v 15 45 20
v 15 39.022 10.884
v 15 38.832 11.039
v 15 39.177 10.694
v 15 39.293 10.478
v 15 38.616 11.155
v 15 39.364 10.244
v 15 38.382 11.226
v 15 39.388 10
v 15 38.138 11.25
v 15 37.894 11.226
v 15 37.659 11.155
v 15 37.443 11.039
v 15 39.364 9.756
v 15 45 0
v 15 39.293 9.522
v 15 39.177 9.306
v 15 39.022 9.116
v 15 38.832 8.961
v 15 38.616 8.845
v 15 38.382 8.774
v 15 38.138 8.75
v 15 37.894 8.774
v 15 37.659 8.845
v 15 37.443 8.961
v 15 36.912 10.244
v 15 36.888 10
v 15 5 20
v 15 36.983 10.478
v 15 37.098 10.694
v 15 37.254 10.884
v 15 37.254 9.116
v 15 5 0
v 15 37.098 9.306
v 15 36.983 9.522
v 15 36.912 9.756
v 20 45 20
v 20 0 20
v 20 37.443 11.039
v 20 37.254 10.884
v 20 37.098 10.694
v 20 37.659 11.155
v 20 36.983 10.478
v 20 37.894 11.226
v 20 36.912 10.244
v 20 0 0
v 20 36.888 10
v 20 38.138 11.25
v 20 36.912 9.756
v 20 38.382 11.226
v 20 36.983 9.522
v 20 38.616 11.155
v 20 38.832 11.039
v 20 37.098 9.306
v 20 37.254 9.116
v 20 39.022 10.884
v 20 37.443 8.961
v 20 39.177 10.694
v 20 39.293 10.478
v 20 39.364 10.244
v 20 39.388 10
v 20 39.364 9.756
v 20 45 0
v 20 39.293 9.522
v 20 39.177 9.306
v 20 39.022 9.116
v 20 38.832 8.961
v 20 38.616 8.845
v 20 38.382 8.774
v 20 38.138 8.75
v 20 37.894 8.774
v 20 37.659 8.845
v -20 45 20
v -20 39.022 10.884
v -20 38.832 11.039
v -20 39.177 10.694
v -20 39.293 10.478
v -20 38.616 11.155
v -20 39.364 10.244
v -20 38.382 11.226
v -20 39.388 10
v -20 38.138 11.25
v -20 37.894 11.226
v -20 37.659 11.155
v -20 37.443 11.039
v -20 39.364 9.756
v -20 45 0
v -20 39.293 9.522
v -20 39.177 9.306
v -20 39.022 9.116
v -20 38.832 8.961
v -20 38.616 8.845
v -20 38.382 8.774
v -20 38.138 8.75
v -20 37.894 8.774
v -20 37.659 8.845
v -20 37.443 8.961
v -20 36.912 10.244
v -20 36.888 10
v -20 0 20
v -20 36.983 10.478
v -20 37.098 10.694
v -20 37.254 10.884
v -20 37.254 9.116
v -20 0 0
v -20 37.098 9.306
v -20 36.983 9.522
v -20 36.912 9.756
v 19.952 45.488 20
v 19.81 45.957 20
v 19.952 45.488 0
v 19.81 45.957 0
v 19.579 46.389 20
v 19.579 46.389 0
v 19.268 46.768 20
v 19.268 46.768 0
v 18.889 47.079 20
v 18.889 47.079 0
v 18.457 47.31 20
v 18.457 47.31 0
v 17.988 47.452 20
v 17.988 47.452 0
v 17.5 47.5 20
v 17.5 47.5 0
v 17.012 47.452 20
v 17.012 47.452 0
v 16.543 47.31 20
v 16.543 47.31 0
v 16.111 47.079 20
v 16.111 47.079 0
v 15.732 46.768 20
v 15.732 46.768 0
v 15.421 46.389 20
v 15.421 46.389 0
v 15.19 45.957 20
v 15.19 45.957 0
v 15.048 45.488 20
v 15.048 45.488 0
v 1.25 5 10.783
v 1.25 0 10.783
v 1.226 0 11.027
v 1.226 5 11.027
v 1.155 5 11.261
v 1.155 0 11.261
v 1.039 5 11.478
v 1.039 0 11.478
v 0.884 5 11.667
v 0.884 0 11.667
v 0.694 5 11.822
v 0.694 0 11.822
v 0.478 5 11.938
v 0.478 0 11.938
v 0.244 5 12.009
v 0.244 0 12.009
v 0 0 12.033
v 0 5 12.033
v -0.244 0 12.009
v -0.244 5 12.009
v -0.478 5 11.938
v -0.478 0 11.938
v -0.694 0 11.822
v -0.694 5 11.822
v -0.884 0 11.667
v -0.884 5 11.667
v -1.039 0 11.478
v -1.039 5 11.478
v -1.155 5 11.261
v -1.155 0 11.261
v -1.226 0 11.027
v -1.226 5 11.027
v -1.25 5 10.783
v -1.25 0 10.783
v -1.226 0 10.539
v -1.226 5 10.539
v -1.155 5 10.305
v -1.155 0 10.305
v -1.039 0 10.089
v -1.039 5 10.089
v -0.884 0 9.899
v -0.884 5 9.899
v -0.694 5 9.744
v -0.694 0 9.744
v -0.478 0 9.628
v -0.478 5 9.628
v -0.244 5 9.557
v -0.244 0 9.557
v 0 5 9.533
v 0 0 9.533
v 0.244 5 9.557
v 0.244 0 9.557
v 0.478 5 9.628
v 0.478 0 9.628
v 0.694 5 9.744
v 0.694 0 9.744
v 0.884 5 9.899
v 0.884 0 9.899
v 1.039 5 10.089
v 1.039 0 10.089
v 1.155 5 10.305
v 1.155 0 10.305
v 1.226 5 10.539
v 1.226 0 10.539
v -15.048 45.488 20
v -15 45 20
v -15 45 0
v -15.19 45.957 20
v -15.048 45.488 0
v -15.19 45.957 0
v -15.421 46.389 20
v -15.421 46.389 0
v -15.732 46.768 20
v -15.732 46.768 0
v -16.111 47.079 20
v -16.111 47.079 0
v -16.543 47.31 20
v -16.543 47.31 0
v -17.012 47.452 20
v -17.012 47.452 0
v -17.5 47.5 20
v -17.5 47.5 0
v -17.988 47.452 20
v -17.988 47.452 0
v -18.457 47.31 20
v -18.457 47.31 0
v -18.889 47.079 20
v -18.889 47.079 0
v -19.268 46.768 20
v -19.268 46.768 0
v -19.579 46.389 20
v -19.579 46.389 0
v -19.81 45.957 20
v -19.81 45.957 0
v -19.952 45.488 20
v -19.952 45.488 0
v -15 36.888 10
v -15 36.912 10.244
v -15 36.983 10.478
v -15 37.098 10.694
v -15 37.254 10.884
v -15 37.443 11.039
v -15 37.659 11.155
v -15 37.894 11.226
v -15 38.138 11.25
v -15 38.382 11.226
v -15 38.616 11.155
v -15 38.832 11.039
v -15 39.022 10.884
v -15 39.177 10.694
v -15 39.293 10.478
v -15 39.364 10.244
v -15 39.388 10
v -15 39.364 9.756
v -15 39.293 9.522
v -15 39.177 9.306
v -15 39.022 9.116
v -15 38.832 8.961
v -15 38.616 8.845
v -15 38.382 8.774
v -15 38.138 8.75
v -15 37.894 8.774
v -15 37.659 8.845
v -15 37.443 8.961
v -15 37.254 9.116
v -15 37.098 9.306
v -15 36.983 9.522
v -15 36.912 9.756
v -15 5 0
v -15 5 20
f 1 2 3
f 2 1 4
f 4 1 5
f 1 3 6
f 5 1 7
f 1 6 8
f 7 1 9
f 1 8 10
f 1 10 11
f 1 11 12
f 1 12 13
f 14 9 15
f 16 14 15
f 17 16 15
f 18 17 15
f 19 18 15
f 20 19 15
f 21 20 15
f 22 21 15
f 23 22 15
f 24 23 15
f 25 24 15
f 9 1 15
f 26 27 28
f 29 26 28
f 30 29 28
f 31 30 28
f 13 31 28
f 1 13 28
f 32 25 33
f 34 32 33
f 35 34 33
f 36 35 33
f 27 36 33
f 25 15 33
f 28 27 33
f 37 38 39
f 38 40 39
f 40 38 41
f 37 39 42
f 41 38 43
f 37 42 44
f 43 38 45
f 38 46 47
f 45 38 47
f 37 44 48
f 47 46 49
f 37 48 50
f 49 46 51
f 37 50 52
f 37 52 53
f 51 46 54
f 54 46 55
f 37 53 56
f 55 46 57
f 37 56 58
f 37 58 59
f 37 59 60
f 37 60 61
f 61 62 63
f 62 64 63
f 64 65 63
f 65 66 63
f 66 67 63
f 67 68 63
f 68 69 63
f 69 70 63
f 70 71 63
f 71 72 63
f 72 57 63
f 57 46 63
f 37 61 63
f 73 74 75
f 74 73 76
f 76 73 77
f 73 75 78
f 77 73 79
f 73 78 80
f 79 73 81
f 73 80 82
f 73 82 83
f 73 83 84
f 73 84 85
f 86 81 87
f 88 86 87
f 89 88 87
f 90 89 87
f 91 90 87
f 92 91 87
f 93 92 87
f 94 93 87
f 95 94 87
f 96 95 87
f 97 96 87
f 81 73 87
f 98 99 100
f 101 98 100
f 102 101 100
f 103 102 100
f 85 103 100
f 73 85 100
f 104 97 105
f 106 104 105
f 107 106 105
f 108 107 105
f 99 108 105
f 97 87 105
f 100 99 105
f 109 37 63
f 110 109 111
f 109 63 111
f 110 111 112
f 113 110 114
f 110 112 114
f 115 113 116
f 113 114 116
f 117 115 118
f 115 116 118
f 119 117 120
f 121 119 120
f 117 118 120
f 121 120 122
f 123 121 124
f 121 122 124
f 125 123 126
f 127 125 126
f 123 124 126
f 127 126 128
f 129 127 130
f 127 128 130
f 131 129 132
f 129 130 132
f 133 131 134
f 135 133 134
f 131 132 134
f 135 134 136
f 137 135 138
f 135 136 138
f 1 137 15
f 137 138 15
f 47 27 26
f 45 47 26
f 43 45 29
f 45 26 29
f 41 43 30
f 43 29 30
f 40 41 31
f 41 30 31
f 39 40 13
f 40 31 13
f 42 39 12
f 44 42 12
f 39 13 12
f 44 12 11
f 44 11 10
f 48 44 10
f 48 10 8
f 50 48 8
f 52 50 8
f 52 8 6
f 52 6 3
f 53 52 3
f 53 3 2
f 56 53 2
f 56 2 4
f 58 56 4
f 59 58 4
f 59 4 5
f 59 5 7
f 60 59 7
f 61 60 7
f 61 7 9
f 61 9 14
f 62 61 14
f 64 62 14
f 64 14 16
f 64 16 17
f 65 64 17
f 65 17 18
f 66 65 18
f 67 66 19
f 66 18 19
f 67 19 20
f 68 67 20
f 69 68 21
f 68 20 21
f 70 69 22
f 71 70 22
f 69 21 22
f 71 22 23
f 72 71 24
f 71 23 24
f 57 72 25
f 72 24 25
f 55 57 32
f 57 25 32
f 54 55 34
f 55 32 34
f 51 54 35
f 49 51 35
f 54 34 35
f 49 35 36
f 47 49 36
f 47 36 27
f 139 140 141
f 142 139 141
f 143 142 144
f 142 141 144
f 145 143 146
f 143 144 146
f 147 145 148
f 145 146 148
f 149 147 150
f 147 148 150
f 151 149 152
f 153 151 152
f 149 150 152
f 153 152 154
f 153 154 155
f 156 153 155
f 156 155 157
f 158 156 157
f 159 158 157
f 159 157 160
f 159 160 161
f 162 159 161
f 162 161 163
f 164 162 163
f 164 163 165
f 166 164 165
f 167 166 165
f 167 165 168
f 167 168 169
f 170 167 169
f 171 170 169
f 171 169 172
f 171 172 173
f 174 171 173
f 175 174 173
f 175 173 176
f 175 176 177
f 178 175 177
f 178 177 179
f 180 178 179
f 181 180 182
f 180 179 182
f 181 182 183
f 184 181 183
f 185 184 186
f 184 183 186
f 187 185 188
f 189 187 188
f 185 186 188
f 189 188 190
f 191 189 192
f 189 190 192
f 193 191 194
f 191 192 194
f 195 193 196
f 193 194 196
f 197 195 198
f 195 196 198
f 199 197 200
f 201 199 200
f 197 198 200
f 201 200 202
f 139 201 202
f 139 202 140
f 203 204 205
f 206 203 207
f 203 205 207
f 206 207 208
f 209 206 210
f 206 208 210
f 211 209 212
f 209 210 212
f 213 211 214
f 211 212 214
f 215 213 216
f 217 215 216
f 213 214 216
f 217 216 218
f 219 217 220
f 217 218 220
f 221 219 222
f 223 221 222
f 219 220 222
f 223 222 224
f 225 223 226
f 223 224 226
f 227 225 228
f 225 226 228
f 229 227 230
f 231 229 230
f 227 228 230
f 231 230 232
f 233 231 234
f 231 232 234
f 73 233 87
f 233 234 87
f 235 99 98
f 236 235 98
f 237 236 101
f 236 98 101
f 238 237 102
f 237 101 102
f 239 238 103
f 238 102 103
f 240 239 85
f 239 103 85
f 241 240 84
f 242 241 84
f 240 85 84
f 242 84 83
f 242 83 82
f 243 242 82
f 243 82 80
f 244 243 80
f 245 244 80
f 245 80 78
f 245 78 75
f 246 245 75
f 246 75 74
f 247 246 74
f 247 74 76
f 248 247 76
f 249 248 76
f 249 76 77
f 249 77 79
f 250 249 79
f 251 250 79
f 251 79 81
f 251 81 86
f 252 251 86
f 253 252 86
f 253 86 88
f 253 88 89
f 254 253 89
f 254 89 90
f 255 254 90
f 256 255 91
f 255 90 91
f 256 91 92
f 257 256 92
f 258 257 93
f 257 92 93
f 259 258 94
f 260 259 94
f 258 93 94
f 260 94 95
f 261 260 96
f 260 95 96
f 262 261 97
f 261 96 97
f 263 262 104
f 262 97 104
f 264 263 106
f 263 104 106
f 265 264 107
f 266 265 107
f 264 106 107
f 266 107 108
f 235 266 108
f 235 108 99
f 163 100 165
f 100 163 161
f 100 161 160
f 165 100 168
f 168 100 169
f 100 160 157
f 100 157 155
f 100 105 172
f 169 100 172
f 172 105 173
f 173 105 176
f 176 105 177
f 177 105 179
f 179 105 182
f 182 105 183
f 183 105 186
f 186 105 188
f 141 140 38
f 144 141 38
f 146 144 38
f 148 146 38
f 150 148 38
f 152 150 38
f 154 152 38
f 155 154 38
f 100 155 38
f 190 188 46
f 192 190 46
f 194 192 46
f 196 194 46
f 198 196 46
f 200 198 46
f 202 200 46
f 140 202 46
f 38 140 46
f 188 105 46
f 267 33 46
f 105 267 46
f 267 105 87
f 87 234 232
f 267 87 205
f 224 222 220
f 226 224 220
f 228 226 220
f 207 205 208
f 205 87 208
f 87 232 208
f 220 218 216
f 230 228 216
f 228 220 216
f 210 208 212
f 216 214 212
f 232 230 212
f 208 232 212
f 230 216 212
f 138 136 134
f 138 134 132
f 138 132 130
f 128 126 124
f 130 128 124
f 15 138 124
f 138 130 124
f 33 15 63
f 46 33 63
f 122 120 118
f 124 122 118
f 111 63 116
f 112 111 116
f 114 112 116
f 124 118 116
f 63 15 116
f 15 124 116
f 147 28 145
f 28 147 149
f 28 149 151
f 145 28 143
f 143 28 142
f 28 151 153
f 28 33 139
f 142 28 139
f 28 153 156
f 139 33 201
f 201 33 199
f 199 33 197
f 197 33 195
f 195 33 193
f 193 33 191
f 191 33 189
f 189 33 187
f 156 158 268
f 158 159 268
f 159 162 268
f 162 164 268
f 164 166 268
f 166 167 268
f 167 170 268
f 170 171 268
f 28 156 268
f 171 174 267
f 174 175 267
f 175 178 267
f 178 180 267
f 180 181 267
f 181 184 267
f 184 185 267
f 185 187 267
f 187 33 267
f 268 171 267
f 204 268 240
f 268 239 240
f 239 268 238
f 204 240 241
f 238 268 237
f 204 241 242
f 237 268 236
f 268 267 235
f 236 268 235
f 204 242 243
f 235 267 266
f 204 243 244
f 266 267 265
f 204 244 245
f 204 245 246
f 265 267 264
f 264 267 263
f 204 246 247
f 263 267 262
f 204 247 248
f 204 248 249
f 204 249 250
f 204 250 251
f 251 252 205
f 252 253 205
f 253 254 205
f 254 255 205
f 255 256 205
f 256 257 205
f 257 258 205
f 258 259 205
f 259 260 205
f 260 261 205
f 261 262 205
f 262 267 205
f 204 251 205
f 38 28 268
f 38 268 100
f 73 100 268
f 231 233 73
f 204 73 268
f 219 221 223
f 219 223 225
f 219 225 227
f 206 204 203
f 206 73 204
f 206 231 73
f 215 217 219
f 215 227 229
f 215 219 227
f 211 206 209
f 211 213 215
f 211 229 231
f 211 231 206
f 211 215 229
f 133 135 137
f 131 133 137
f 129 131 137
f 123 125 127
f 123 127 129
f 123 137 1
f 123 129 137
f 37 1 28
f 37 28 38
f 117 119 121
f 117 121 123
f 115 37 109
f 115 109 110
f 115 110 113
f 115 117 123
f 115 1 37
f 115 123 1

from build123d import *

# Parameters (mm, degrees)
BOSS_EXTRUDE3_DEPTH = 20
SKETCH3_R           = 1.25
CUT_EXTRUDE1_DEPTH  = 66.239941753
SKETCH5_R           = 1.25
CUT_EXTRUDE2_DEPTH  = 56.283360969


with BuildPart() as part:
    # Sketch2 → Boss-Extrude3 (new body)
    with BuildSketch(Plane.XY):
        with BuildLine():
            Line((-20, 0), (20, 0))
            Line((20, 0), (20, 45))
            ThreePointArc((20, 45), (17.5, 47.5), (15, 45))
            Line((15, 45), (15, 5))
            Line((15, 5), (-15, 5))
            Line((-15, 5), (-15, 45))
            ThreePointArc((-15, 45), (-17.5, 47.5), (-20, 45))
            Line((-20, 45), (-20, 0))
        make_face()
    extrude(amount=BOSS_EXTRUDE3_DEPTH)

    # Sketch3 → Cut-Extrude1 (cut, through all)
    with BuildSketch(Plane.ZY.offset(20)):
        with Locations(Location((10, 38.137651085, 0), (0, 0, 270))):
            Circle(SKETCH3_R)
    extrude(amount=-CUT_EXTRUDE1_DEPTH, mode=Mode.SUBTRACT)

    # Sketch5 → Cut-Extrude2 (cut, through all)
    with BuildSketch(Plane.XZ):
        with Locations((0, 10.783115236)):
            Circle(SKETCH5_R)
    extrude(amount=-CUT_EXTRUDE2_DEPTH, mode=Mode.SUBTRACT)


solid = part.part
